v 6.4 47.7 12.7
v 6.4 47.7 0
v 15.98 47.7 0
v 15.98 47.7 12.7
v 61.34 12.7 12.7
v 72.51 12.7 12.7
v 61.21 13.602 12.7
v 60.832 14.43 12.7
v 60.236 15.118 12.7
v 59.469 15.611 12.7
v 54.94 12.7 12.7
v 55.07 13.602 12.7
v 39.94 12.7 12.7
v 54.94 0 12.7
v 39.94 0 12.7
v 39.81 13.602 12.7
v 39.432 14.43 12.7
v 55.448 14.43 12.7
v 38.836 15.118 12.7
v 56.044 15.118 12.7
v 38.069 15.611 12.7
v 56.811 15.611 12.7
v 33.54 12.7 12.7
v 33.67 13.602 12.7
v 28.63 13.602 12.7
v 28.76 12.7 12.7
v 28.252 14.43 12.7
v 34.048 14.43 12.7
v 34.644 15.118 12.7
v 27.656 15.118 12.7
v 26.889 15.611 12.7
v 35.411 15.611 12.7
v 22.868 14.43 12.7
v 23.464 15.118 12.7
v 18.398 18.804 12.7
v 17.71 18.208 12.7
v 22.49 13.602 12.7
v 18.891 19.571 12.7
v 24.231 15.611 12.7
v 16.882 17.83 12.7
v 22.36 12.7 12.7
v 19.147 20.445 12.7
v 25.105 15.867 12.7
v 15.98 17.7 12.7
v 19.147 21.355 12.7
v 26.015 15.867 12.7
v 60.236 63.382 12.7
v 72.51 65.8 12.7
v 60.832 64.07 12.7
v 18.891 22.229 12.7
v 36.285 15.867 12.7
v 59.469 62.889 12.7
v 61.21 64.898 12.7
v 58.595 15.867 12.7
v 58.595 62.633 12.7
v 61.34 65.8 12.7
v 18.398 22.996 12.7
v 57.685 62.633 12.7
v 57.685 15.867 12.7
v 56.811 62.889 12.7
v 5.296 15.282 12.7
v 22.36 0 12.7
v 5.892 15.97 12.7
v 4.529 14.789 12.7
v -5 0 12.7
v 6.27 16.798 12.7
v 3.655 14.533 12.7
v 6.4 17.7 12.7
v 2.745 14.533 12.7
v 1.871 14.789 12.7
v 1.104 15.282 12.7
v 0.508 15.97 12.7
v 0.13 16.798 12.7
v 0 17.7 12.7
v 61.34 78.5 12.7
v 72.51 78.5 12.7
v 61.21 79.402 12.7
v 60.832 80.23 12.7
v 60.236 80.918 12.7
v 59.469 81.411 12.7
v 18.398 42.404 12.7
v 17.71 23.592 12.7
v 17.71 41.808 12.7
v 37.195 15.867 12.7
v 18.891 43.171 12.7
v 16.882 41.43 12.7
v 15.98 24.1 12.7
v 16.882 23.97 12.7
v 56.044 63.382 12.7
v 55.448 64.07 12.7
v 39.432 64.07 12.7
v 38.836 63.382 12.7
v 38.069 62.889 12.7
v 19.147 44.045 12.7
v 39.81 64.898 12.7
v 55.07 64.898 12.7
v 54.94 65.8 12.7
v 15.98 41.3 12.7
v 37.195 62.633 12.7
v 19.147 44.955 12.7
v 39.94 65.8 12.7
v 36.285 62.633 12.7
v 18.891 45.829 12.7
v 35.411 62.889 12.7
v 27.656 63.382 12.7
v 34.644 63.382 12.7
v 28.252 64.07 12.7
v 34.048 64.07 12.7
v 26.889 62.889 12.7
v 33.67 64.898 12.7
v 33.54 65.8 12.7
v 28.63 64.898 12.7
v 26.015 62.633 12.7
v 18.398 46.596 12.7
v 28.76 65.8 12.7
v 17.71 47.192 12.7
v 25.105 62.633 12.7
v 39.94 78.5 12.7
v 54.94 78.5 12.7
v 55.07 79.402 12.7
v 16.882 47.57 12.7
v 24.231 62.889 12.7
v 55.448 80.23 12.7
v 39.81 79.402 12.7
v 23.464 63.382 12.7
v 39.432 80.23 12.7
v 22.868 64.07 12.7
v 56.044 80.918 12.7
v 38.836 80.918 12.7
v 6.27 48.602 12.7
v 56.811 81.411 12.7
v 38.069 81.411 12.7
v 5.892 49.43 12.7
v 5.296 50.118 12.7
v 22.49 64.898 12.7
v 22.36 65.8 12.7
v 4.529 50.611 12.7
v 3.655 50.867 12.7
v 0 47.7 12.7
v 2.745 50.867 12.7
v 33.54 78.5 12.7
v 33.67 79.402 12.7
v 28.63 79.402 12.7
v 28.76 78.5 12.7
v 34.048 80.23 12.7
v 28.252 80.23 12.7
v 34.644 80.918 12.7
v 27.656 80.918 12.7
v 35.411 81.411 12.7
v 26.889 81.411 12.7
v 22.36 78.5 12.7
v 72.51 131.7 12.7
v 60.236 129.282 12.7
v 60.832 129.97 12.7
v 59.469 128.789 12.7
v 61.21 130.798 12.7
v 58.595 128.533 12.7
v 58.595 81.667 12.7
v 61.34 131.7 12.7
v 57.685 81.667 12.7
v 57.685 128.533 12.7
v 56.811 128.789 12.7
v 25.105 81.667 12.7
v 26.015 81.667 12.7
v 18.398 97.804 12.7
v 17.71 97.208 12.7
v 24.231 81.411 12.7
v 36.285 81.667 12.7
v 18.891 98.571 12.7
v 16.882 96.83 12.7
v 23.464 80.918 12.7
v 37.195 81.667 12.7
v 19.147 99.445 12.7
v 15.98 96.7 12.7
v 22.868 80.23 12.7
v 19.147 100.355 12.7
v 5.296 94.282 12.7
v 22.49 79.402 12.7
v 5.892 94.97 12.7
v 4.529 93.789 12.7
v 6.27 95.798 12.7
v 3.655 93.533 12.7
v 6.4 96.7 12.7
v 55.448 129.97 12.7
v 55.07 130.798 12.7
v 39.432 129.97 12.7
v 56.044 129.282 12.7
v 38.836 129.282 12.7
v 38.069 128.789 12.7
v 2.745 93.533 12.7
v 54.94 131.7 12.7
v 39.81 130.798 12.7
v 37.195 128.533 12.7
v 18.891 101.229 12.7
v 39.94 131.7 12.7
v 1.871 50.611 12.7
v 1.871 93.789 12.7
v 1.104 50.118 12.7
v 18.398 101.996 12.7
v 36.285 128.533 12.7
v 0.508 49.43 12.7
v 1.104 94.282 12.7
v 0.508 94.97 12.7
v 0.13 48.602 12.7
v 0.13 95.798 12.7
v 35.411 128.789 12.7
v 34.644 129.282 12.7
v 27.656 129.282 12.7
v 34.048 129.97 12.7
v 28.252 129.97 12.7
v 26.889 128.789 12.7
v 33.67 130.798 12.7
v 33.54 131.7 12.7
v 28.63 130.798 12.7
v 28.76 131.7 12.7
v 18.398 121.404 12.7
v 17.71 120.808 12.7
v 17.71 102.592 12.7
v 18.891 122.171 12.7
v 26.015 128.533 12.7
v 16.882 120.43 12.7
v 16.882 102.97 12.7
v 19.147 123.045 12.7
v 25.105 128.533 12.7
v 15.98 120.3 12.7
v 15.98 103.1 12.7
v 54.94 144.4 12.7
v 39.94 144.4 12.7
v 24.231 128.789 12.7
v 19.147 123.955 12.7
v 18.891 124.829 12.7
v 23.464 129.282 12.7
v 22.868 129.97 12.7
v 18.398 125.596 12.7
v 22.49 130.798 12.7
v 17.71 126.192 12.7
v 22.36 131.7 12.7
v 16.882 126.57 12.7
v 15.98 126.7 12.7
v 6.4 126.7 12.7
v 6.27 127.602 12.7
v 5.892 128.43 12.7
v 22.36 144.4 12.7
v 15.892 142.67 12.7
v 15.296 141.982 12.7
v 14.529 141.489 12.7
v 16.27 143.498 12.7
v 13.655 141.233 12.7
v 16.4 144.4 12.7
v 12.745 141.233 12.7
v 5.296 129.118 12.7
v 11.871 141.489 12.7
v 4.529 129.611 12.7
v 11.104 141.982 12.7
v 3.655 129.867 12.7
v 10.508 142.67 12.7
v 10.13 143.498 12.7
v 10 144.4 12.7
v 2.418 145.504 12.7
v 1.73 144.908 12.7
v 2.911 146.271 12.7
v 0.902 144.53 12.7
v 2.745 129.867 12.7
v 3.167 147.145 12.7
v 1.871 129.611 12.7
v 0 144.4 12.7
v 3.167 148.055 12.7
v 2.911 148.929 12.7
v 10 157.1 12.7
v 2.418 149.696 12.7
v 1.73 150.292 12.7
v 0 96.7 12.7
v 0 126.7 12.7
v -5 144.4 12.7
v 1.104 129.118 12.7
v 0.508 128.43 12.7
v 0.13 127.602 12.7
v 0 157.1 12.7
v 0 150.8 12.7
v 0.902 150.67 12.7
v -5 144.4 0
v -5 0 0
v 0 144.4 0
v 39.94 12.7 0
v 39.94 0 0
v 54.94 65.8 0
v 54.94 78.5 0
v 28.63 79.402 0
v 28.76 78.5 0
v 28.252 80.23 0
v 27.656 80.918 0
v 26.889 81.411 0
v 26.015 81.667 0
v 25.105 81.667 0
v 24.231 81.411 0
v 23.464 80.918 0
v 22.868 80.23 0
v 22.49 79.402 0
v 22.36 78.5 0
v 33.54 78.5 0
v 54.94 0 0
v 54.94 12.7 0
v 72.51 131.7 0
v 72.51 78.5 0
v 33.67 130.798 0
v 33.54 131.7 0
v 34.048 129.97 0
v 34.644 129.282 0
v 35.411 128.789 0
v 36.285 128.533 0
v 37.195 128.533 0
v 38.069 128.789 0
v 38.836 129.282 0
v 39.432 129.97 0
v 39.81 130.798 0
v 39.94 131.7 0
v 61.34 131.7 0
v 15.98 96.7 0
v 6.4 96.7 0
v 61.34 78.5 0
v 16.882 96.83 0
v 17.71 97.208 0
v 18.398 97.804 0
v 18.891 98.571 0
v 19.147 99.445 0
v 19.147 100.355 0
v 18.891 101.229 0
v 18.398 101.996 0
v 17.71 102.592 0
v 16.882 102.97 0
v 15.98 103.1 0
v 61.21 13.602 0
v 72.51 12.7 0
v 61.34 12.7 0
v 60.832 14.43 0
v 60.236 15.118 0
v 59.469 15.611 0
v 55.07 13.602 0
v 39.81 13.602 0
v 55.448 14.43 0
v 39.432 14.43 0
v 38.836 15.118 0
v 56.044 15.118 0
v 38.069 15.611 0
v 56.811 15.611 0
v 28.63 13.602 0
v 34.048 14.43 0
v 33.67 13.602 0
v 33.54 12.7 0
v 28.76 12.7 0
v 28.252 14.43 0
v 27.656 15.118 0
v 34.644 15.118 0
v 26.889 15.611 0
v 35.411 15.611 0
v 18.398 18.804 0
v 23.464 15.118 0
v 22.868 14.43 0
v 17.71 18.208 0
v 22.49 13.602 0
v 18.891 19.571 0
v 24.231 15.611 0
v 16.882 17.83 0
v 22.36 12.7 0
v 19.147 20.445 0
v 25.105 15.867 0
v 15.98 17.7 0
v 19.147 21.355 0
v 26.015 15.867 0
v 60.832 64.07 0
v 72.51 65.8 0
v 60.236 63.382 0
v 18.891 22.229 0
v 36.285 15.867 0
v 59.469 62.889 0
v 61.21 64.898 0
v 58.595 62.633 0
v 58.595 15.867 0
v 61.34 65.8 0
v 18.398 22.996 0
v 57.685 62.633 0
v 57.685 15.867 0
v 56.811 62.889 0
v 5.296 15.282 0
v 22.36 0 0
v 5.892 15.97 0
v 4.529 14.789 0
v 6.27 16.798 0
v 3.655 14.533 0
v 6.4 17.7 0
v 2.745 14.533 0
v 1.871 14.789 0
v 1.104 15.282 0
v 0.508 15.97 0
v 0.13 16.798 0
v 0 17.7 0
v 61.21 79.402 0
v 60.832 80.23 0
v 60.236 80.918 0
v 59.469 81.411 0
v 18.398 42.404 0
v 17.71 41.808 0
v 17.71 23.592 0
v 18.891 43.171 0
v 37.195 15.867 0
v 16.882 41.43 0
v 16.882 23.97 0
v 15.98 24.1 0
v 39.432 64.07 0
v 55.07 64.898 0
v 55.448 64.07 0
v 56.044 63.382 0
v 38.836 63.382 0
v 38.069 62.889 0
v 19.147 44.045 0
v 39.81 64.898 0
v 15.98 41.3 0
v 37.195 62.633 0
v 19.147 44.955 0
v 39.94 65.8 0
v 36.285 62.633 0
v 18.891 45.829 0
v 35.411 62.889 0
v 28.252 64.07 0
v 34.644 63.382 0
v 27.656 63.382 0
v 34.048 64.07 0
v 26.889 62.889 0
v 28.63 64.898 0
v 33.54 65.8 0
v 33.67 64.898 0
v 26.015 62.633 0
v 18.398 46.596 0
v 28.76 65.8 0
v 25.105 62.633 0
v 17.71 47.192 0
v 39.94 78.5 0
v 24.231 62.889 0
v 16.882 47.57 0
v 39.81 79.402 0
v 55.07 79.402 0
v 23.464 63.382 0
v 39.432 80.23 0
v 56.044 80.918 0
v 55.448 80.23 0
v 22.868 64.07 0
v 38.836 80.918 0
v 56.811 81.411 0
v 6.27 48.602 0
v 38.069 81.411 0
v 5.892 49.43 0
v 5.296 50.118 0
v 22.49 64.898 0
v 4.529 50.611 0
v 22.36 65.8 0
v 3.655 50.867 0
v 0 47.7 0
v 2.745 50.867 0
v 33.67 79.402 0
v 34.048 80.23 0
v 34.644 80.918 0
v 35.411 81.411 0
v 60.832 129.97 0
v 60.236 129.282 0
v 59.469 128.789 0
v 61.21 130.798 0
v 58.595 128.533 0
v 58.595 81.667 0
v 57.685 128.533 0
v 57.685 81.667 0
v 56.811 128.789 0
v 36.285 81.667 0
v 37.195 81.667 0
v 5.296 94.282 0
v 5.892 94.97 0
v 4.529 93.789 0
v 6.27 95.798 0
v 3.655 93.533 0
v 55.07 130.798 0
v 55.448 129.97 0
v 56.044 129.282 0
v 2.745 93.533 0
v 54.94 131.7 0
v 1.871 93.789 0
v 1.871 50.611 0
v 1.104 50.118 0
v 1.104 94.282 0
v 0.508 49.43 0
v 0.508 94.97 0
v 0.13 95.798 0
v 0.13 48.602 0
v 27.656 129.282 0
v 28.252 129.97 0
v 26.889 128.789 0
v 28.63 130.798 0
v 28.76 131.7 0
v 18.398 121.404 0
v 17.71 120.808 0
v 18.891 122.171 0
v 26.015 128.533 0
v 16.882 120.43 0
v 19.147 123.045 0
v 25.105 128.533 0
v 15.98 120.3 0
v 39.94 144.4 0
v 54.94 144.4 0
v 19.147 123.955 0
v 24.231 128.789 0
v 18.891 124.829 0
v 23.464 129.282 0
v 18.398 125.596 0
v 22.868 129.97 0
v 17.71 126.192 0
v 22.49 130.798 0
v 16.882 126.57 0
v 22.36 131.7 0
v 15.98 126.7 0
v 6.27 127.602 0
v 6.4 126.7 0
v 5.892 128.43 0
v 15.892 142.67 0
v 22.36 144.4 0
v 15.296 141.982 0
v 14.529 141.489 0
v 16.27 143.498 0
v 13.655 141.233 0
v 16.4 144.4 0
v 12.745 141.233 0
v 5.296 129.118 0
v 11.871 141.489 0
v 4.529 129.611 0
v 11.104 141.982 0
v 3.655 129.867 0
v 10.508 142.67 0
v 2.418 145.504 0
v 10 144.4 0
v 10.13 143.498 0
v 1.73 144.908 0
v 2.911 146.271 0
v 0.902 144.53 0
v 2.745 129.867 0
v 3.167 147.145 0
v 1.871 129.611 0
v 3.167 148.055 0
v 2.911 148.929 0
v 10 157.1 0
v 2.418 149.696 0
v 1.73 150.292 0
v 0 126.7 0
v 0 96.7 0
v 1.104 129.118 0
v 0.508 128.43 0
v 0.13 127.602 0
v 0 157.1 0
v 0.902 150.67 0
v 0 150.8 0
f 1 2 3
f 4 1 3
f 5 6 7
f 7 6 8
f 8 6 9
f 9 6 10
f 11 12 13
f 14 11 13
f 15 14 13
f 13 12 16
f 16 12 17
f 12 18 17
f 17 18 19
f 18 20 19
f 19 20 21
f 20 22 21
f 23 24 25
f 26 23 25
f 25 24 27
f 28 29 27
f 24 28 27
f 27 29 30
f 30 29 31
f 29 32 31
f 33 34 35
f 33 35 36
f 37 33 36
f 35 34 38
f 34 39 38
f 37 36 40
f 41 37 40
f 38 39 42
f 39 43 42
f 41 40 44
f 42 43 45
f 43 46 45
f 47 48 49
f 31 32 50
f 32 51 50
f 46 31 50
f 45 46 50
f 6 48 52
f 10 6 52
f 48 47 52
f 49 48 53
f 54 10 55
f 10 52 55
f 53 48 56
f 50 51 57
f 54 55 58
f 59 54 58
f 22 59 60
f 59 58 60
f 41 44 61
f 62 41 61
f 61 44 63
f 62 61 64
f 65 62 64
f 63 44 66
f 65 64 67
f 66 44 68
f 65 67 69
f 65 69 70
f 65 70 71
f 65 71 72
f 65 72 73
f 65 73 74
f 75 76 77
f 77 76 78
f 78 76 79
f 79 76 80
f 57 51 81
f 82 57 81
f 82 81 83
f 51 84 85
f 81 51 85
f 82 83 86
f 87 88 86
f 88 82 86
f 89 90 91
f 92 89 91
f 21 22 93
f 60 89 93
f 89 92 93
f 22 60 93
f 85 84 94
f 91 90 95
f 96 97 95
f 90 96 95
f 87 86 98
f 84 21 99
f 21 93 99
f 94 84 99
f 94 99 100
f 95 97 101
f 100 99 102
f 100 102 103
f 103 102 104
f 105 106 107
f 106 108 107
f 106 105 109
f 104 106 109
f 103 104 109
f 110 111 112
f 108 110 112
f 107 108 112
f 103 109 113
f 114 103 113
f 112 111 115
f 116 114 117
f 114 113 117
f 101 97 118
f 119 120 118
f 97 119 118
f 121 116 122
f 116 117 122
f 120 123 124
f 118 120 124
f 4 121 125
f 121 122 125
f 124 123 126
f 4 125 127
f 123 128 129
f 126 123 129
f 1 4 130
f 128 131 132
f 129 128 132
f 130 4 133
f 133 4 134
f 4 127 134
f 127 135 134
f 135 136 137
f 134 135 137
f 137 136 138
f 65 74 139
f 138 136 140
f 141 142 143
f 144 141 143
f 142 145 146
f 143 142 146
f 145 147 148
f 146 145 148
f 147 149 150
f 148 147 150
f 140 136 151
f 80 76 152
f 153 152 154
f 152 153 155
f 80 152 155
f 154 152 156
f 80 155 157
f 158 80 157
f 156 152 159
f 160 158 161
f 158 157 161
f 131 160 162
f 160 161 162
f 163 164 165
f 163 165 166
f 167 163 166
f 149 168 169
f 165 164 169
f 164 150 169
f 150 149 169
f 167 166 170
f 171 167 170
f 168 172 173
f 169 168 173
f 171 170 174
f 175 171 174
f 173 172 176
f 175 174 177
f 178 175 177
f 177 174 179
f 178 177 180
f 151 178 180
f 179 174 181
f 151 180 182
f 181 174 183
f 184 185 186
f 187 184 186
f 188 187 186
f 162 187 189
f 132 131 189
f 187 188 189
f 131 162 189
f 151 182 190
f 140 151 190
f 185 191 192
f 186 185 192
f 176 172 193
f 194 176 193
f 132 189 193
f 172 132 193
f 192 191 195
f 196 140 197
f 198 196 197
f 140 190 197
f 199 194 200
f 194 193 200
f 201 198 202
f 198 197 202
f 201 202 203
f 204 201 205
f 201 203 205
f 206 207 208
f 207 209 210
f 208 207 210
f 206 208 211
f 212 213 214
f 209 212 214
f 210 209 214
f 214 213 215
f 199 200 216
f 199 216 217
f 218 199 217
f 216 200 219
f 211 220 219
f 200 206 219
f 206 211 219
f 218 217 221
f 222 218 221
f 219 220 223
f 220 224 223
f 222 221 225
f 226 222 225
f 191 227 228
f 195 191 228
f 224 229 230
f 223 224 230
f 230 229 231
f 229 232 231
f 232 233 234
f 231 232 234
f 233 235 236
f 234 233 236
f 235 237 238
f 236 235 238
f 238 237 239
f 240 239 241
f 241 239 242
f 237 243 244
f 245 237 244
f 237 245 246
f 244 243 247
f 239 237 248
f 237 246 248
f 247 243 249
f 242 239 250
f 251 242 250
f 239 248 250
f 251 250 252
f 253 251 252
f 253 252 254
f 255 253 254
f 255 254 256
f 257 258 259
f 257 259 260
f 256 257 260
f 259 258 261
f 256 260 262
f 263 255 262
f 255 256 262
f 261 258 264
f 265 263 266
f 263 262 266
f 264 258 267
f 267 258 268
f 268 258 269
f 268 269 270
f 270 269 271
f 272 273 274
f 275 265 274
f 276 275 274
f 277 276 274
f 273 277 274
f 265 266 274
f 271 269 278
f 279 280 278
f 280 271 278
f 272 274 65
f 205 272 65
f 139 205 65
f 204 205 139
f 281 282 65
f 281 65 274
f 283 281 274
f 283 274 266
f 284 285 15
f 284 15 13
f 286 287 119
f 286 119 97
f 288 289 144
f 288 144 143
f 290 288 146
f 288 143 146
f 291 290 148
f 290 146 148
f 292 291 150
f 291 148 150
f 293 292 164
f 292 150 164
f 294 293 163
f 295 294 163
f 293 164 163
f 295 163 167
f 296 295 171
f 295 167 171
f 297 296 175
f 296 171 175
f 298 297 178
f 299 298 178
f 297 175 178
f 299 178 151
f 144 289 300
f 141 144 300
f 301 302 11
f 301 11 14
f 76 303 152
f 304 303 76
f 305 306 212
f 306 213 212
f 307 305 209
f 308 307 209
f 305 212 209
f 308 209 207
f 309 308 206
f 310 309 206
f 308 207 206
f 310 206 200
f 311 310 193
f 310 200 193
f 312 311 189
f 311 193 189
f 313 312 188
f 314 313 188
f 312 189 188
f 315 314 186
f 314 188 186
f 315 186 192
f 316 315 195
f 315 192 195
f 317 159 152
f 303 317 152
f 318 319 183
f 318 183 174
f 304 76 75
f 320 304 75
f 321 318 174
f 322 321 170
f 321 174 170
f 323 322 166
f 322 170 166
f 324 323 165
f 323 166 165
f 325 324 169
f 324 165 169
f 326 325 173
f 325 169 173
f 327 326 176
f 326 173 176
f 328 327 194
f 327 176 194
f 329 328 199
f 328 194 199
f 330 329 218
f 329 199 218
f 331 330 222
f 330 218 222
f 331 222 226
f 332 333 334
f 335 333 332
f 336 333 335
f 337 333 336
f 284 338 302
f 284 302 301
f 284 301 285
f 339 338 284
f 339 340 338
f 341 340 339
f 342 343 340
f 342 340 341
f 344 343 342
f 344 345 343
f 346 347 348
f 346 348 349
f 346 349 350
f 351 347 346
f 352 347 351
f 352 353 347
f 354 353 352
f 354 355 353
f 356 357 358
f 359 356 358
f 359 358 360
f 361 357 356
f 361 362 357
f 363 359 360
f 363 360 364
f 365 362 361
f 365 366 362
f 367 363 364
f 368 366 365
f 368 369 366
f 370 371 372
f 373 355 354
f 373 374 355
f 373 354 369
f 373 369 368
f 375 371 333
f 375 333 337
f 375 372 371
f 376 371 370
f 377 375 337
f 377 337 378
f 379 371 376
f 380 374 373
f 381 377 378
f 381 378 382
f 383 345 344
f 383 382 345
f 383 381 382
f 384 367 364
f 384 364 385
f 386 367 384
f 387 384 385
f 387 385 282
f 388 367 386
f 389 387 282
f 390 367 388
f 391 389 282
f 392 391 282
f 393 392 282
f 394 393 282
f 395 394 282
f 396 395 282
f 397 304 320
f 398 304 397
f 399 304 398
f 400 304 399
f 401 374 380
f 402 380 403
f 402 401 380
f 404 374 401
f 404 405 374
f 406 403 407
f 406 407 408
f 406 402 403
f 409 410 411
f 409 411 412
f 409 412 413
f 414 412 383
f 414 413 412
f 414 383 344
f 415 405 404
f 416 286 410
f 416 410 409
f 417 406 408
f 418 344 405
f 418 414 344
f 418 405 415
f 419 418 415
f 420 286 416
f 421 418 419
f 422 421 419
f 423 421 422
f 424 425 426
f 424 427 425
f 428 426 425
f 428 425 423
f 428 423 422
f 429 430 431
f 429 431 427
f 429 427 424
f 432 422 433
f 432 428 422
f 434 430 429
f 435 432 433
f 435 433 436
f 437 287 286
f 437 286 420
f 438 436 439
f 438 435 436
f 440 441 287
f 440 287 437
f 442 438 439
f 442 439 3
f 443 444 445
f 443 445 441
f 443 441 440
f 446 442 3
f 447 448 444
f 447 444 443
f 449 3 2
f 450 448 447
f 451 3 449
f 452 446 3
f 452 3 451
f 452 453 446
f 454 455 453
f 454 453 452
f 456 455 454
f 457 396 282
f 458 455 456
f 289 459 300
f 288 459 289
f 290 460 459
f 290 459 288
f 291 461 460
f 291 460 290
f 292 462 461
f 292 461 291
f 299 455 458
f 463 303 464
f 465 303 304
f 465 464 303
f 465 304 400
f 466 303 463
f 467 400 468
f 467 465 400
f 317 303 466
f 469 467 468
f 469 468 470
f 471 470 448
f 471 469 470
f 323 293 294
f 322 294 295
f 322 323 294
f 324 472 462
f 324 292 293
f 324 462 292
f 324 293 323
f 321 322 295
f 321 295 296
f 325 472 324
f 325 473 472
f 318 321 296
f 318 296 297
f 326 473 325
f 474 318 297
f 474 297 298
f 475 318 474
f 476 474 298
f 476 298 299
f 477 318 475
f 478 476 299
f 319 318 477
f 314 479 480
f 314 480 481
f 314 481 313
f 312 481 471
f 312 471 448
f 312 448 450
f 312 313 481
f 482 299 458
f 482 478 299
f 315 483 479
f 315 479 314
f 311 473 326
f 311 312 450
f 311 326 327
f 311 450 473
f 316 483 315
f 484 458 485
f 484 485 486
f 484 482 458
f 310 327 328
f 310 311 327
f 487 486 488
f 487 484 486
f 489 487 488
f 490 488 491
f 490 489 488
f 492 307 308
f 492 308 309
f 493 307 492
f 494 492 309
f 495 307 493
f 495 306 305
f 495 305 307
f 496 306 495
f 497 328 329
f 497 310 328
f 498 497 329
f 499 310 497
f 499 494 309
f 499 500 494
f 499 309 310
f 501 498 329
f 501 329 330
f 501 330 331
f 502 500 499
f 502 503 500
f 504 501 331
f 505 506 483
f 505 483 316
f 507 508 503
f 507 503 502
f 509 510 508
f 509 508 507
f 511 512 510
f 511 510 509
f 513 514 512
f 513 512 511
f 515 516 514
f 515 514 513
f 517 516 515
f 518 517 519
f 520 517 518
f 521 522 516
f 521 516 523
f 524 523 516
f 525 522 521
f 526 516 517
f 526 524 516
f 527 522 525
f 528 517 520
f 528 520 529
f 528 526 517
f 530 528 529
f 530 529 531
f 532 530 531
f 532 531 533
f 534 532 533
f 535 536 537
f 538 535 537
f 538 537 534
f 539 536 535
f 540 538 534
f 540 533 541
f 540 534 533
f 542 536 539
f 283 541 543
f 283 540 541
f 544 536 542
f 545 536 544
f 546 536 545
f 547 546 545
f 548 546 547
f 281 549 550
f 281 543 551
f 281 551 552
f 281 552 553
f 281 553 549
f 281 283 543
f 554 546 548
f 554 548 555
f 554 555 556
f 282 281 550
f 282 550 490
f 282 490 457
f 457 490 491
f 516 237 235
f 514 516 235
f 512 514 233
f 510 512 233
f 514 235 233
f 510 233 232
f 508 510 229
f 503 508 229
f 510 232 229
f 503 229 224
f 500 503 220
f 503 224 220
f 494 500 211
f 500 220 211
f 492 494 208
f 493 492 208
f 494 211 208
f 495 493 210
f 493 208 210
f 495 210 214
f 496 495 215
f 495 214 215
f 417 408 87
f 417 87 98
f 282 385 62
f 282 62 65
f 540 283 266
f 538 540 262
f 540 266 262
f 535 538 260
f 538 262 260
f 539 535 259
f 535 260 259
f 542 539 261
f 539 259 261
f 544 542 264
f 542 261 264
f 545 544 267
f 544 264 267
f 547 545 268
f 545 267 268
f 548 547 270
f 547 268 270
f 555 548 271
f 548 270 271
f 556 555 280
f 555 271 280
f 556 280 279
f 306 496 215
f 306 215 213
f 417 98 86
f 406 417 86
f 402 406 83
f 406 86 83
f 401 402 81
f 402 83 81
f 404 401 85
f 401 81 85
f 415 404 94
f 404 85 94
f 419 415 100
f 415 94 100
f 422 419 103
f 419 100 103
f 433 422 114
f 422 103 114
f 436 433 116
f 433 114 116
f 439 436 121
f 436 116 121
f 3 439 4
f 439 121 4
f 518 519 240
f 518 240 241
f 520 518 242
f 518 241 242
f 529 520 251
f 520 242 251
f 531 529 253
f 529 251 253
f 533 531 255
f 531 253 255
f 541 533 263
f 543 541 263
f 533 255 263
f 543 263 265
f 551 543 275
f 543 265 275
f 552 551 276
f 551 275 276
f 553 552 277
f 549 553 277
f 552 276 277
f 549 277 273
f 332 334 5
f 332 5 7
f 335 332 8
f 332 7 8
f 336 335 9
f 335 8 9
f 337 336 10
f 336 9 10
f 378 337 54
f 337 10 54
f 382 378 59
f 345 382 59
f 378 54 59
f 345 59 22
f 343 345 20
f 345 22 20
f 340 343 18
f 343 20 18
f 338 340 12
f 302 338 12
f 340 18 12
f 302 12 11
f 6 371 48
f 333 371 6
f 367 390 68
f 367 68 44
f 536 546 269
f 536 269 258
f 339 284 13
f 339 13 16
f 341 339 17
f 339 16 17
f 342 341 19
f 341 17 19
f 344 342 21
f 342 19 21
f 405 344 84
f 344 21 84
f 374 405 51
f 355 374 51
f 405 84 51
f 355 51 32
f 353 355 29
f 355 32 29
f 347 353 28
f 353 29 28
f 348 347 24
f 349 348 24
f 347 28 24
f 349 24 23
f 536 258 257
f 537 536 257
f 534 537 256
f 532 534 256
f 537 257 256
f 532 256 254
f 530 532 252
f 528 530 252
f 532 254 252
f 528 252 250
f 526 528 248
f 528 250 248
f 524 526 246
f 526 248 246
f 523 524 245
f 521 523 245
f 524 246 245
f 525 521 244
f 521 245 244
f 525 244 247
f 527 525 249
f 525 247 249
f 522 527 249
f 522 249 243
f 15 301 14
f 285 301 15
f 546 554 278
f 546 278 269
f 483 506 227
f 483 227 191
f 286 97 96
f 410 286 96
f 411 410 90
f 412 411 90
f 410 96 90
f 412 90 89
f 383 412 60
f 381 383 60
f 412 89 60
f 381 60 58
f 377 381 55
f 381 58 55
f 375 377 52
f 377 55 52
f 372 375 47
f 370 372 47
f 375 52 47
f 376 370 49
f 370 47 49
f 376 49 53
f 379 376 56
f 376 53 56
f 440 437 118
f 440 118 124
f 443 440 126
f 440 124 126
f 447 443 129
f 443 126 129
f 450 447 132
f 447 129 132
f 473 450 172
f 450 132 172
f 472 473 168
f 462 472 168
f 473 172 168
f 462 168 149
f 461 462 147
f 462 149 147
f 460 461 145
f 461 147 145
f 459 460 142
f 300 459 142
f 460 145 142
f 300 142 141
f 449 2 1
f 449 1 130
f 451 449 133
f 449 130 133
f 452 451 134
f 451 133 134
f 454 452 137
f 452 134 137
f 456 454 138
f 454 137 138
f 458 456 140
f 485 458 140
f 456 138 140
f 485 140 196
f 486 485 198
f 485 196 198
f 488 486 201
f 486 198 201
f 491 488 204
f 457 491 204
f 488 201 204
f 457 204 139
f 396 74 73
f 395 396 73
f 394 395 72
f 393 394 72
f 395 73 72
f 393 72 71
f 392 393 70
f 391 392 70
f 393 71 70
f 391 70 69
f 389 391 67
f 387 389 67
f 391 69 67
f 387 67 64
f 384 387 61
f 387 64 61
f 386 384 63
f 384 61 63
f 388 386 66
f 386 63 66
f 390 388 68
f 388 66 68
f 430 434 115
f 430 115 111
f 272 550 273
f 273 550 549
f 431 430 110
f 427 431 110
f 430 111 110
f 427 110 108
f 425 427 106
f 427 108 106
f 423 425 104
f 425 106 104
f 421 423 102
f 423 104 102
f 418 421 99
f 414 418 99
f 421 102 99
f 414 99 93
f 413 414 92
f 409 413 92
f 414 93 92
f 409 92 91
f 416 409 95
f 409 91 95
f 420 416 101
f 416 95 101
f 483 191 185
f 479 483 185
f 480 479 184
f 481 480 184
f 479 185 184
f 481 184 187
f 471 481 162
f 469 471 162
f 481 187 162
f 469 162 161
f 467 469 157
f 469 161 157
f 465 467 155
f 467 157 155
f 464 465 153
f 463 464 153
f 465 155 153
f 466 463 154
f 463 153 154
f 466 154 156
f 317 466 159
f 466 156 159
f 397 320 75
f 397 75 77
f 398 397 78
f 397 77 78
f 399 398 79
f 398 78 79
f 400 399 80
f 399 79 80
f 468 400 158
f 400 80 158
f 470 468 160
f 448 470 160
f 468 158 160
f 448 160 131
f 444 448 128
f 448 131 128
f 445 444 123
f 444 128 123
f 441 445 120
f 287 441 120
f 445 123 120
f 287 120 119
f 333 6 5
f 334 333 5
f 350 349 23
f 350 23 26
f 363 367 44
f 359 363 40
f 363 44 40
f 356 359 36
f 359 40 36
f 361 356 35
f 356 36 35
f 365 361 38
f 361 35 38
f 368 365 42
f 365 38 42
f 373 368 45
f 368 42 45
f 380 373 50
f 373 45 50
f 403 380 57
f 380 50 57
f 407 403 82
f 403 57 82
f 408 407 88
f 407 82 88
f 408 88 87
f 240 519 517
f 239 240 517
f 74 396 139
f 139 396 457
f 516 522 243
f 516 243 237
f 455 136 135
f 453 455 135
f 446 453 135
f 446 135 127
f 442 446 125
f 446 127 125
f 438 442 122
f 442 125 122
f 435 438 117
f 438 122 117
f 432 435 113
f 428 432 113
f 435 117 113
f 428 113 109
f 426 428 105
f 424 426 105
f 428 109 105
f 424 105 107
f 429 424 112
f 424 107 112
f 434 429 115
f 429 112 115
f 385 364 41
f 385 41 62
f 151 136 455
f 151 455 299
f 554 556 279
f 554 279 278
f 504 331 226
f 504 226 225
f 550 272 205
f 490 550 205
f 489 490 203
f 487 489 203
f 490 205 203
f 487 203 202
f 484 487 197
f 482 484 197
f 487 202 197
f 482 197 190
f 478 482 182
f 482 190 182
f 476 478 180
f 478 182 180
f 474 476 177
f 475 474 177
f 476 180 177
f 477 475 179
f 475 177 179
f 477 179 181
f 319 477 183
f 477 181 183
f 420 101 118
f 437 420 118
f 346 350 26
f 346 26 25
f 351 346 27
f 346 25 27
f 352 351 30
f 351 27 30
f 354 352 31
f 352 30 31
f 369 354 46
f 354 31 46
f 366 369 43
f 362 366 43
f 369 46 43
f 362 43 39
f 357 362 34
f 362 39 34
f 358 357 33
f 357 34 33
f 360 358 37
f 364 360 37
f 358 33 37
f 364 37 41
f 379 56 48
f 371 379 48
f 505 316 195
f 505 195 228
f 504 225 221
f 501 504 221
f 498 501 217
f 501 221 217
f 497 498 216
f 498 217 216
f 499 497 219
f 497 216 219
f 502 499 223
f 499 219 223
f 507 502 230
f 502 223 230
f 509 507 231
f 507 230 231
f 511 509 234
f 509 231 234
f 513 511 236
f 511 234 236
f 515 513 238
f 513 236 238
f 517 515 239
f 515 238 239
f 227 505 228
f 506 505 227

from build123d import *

# Parameters (mm, degrees)
SKETCH1_W           = 17.58
SKETCH1_H           = 12.7
SKETCH1_W_2         = 15.98
SKETCH1_H_2         = 30
BOSS_EXTRUDE1_DEPTH = 12.7
SKETCH2_R           = 3.2
CUT_EXTRUDE1_DEPTH  = 174.491786837


with BuildPart() as part:
    # Sketch1 → Boss-Extrude1 (new body)
    with BuildSketch(Plane.XY):
        Polygon((54.94, 144.4), (54.94, 131.7), (72.51, 131.7), (72.51, 78.5), (54.94, 78.5), (54.94, 65.8), (72.51, 65.8), (72.51, 12.7), (54.94, 12.7), (54.94, 0), (39.94, 0), (39.94, 12.7), (22.36, 12.7), (22.36, 0), (-5, 0), (-5, 144.4), (0, 144.4), (0, 157.1), (10, 157.1), (10, 144.4), (22.36, 144.4), (22.36, 131.7), (39.94, 131.7), (39.94, 144.4), align=None)
        with Locations((31.15, 72.15)):
            Rectangle(SKETCH1_W, SKETCH1_H, mode=Mode.SUBTRACT)
        with Locations((7.99, 111.7)):
            Rectangle(SKETCH1_W_2, SKETCH1_H_2, mode=Mode.SUBTRACT)
        with Locations((7.99, 32.7)):
            Rectangle(SKETCH1_W_2, SKETCH1_H_2, mode=Mode.SUBTRACT)
    extrude(amount=BOSS_EXTRUDE1_DEPTH)

    # Sketch2 → Cut-Extrude1 (cut, through all)
    with BuildSketch(Plane.XY.offset(12.7)):
        with Locations((58.14, 131.7)):
            Circle(SKETCH2_R)
        with Locations((58.14, 78.5)):
            Circle(SKETCH2_R)
        with Locations((58.14, 65.8)):
            Circle(SKETCH2_R)
        with Locations((36.74, 78.5)):
            Circle(SKETCH2_R)
        with Locations((36.74, 65.8)):
            Circle(SKETCH2_R)
        with Locations((25.56, 78.5)):
            Circle(SKETCH2_R)
        with Locations((25.56, 65.8)):
            Circle(SKETCH2_R)
        with Locations((25.56, 12.7)):
            Circle(SKETCH2_R)
        with Locations((36.74, 12.7)):
            Circle(SKETCH2_R)
        with Locations((58.14, 12.7)):
            Circle(SKETCH2_R)
        with Locations((36.74, 131.7)):
            Circle(SKETCH2_R)
        with Locations((25.56, 131.7)):
            Circle(SKETCH2_R)
        with Locations((13.2, 144.4)):
            Circle(SKETCH2_R)
        with Locations((15.98, 123.5)):
            Circle(SKETCH2_R)
        with Locations((3.2, 126.7)):
            Circle(SKETCH2_R)
        with Locations((3.2, 96.7)):
            Circle(SKETCH2_R)
        with Locations((15.98, 99.9)):
            Circle(SKETCH2_R)
        with Locations((15.98, 44.5)):
            Circle(SKETCH2_R)
        with Locations((15.98, 20.9)):
            Circle(SKETCH2_R)
        with Locations((3.2, 17.7)):
            Circle(SKETCH2_R)
        with Locations((3.2, 47.7)):
            Circle(SKETCH2_R)
        with Locations((0, 147.6)):
            Circle(SKETCH2_R)
    extrude(amount=-CUT_EXTRUDE1_DEPTH, mode=Mode.SUBTRACT)


solid = part.part
